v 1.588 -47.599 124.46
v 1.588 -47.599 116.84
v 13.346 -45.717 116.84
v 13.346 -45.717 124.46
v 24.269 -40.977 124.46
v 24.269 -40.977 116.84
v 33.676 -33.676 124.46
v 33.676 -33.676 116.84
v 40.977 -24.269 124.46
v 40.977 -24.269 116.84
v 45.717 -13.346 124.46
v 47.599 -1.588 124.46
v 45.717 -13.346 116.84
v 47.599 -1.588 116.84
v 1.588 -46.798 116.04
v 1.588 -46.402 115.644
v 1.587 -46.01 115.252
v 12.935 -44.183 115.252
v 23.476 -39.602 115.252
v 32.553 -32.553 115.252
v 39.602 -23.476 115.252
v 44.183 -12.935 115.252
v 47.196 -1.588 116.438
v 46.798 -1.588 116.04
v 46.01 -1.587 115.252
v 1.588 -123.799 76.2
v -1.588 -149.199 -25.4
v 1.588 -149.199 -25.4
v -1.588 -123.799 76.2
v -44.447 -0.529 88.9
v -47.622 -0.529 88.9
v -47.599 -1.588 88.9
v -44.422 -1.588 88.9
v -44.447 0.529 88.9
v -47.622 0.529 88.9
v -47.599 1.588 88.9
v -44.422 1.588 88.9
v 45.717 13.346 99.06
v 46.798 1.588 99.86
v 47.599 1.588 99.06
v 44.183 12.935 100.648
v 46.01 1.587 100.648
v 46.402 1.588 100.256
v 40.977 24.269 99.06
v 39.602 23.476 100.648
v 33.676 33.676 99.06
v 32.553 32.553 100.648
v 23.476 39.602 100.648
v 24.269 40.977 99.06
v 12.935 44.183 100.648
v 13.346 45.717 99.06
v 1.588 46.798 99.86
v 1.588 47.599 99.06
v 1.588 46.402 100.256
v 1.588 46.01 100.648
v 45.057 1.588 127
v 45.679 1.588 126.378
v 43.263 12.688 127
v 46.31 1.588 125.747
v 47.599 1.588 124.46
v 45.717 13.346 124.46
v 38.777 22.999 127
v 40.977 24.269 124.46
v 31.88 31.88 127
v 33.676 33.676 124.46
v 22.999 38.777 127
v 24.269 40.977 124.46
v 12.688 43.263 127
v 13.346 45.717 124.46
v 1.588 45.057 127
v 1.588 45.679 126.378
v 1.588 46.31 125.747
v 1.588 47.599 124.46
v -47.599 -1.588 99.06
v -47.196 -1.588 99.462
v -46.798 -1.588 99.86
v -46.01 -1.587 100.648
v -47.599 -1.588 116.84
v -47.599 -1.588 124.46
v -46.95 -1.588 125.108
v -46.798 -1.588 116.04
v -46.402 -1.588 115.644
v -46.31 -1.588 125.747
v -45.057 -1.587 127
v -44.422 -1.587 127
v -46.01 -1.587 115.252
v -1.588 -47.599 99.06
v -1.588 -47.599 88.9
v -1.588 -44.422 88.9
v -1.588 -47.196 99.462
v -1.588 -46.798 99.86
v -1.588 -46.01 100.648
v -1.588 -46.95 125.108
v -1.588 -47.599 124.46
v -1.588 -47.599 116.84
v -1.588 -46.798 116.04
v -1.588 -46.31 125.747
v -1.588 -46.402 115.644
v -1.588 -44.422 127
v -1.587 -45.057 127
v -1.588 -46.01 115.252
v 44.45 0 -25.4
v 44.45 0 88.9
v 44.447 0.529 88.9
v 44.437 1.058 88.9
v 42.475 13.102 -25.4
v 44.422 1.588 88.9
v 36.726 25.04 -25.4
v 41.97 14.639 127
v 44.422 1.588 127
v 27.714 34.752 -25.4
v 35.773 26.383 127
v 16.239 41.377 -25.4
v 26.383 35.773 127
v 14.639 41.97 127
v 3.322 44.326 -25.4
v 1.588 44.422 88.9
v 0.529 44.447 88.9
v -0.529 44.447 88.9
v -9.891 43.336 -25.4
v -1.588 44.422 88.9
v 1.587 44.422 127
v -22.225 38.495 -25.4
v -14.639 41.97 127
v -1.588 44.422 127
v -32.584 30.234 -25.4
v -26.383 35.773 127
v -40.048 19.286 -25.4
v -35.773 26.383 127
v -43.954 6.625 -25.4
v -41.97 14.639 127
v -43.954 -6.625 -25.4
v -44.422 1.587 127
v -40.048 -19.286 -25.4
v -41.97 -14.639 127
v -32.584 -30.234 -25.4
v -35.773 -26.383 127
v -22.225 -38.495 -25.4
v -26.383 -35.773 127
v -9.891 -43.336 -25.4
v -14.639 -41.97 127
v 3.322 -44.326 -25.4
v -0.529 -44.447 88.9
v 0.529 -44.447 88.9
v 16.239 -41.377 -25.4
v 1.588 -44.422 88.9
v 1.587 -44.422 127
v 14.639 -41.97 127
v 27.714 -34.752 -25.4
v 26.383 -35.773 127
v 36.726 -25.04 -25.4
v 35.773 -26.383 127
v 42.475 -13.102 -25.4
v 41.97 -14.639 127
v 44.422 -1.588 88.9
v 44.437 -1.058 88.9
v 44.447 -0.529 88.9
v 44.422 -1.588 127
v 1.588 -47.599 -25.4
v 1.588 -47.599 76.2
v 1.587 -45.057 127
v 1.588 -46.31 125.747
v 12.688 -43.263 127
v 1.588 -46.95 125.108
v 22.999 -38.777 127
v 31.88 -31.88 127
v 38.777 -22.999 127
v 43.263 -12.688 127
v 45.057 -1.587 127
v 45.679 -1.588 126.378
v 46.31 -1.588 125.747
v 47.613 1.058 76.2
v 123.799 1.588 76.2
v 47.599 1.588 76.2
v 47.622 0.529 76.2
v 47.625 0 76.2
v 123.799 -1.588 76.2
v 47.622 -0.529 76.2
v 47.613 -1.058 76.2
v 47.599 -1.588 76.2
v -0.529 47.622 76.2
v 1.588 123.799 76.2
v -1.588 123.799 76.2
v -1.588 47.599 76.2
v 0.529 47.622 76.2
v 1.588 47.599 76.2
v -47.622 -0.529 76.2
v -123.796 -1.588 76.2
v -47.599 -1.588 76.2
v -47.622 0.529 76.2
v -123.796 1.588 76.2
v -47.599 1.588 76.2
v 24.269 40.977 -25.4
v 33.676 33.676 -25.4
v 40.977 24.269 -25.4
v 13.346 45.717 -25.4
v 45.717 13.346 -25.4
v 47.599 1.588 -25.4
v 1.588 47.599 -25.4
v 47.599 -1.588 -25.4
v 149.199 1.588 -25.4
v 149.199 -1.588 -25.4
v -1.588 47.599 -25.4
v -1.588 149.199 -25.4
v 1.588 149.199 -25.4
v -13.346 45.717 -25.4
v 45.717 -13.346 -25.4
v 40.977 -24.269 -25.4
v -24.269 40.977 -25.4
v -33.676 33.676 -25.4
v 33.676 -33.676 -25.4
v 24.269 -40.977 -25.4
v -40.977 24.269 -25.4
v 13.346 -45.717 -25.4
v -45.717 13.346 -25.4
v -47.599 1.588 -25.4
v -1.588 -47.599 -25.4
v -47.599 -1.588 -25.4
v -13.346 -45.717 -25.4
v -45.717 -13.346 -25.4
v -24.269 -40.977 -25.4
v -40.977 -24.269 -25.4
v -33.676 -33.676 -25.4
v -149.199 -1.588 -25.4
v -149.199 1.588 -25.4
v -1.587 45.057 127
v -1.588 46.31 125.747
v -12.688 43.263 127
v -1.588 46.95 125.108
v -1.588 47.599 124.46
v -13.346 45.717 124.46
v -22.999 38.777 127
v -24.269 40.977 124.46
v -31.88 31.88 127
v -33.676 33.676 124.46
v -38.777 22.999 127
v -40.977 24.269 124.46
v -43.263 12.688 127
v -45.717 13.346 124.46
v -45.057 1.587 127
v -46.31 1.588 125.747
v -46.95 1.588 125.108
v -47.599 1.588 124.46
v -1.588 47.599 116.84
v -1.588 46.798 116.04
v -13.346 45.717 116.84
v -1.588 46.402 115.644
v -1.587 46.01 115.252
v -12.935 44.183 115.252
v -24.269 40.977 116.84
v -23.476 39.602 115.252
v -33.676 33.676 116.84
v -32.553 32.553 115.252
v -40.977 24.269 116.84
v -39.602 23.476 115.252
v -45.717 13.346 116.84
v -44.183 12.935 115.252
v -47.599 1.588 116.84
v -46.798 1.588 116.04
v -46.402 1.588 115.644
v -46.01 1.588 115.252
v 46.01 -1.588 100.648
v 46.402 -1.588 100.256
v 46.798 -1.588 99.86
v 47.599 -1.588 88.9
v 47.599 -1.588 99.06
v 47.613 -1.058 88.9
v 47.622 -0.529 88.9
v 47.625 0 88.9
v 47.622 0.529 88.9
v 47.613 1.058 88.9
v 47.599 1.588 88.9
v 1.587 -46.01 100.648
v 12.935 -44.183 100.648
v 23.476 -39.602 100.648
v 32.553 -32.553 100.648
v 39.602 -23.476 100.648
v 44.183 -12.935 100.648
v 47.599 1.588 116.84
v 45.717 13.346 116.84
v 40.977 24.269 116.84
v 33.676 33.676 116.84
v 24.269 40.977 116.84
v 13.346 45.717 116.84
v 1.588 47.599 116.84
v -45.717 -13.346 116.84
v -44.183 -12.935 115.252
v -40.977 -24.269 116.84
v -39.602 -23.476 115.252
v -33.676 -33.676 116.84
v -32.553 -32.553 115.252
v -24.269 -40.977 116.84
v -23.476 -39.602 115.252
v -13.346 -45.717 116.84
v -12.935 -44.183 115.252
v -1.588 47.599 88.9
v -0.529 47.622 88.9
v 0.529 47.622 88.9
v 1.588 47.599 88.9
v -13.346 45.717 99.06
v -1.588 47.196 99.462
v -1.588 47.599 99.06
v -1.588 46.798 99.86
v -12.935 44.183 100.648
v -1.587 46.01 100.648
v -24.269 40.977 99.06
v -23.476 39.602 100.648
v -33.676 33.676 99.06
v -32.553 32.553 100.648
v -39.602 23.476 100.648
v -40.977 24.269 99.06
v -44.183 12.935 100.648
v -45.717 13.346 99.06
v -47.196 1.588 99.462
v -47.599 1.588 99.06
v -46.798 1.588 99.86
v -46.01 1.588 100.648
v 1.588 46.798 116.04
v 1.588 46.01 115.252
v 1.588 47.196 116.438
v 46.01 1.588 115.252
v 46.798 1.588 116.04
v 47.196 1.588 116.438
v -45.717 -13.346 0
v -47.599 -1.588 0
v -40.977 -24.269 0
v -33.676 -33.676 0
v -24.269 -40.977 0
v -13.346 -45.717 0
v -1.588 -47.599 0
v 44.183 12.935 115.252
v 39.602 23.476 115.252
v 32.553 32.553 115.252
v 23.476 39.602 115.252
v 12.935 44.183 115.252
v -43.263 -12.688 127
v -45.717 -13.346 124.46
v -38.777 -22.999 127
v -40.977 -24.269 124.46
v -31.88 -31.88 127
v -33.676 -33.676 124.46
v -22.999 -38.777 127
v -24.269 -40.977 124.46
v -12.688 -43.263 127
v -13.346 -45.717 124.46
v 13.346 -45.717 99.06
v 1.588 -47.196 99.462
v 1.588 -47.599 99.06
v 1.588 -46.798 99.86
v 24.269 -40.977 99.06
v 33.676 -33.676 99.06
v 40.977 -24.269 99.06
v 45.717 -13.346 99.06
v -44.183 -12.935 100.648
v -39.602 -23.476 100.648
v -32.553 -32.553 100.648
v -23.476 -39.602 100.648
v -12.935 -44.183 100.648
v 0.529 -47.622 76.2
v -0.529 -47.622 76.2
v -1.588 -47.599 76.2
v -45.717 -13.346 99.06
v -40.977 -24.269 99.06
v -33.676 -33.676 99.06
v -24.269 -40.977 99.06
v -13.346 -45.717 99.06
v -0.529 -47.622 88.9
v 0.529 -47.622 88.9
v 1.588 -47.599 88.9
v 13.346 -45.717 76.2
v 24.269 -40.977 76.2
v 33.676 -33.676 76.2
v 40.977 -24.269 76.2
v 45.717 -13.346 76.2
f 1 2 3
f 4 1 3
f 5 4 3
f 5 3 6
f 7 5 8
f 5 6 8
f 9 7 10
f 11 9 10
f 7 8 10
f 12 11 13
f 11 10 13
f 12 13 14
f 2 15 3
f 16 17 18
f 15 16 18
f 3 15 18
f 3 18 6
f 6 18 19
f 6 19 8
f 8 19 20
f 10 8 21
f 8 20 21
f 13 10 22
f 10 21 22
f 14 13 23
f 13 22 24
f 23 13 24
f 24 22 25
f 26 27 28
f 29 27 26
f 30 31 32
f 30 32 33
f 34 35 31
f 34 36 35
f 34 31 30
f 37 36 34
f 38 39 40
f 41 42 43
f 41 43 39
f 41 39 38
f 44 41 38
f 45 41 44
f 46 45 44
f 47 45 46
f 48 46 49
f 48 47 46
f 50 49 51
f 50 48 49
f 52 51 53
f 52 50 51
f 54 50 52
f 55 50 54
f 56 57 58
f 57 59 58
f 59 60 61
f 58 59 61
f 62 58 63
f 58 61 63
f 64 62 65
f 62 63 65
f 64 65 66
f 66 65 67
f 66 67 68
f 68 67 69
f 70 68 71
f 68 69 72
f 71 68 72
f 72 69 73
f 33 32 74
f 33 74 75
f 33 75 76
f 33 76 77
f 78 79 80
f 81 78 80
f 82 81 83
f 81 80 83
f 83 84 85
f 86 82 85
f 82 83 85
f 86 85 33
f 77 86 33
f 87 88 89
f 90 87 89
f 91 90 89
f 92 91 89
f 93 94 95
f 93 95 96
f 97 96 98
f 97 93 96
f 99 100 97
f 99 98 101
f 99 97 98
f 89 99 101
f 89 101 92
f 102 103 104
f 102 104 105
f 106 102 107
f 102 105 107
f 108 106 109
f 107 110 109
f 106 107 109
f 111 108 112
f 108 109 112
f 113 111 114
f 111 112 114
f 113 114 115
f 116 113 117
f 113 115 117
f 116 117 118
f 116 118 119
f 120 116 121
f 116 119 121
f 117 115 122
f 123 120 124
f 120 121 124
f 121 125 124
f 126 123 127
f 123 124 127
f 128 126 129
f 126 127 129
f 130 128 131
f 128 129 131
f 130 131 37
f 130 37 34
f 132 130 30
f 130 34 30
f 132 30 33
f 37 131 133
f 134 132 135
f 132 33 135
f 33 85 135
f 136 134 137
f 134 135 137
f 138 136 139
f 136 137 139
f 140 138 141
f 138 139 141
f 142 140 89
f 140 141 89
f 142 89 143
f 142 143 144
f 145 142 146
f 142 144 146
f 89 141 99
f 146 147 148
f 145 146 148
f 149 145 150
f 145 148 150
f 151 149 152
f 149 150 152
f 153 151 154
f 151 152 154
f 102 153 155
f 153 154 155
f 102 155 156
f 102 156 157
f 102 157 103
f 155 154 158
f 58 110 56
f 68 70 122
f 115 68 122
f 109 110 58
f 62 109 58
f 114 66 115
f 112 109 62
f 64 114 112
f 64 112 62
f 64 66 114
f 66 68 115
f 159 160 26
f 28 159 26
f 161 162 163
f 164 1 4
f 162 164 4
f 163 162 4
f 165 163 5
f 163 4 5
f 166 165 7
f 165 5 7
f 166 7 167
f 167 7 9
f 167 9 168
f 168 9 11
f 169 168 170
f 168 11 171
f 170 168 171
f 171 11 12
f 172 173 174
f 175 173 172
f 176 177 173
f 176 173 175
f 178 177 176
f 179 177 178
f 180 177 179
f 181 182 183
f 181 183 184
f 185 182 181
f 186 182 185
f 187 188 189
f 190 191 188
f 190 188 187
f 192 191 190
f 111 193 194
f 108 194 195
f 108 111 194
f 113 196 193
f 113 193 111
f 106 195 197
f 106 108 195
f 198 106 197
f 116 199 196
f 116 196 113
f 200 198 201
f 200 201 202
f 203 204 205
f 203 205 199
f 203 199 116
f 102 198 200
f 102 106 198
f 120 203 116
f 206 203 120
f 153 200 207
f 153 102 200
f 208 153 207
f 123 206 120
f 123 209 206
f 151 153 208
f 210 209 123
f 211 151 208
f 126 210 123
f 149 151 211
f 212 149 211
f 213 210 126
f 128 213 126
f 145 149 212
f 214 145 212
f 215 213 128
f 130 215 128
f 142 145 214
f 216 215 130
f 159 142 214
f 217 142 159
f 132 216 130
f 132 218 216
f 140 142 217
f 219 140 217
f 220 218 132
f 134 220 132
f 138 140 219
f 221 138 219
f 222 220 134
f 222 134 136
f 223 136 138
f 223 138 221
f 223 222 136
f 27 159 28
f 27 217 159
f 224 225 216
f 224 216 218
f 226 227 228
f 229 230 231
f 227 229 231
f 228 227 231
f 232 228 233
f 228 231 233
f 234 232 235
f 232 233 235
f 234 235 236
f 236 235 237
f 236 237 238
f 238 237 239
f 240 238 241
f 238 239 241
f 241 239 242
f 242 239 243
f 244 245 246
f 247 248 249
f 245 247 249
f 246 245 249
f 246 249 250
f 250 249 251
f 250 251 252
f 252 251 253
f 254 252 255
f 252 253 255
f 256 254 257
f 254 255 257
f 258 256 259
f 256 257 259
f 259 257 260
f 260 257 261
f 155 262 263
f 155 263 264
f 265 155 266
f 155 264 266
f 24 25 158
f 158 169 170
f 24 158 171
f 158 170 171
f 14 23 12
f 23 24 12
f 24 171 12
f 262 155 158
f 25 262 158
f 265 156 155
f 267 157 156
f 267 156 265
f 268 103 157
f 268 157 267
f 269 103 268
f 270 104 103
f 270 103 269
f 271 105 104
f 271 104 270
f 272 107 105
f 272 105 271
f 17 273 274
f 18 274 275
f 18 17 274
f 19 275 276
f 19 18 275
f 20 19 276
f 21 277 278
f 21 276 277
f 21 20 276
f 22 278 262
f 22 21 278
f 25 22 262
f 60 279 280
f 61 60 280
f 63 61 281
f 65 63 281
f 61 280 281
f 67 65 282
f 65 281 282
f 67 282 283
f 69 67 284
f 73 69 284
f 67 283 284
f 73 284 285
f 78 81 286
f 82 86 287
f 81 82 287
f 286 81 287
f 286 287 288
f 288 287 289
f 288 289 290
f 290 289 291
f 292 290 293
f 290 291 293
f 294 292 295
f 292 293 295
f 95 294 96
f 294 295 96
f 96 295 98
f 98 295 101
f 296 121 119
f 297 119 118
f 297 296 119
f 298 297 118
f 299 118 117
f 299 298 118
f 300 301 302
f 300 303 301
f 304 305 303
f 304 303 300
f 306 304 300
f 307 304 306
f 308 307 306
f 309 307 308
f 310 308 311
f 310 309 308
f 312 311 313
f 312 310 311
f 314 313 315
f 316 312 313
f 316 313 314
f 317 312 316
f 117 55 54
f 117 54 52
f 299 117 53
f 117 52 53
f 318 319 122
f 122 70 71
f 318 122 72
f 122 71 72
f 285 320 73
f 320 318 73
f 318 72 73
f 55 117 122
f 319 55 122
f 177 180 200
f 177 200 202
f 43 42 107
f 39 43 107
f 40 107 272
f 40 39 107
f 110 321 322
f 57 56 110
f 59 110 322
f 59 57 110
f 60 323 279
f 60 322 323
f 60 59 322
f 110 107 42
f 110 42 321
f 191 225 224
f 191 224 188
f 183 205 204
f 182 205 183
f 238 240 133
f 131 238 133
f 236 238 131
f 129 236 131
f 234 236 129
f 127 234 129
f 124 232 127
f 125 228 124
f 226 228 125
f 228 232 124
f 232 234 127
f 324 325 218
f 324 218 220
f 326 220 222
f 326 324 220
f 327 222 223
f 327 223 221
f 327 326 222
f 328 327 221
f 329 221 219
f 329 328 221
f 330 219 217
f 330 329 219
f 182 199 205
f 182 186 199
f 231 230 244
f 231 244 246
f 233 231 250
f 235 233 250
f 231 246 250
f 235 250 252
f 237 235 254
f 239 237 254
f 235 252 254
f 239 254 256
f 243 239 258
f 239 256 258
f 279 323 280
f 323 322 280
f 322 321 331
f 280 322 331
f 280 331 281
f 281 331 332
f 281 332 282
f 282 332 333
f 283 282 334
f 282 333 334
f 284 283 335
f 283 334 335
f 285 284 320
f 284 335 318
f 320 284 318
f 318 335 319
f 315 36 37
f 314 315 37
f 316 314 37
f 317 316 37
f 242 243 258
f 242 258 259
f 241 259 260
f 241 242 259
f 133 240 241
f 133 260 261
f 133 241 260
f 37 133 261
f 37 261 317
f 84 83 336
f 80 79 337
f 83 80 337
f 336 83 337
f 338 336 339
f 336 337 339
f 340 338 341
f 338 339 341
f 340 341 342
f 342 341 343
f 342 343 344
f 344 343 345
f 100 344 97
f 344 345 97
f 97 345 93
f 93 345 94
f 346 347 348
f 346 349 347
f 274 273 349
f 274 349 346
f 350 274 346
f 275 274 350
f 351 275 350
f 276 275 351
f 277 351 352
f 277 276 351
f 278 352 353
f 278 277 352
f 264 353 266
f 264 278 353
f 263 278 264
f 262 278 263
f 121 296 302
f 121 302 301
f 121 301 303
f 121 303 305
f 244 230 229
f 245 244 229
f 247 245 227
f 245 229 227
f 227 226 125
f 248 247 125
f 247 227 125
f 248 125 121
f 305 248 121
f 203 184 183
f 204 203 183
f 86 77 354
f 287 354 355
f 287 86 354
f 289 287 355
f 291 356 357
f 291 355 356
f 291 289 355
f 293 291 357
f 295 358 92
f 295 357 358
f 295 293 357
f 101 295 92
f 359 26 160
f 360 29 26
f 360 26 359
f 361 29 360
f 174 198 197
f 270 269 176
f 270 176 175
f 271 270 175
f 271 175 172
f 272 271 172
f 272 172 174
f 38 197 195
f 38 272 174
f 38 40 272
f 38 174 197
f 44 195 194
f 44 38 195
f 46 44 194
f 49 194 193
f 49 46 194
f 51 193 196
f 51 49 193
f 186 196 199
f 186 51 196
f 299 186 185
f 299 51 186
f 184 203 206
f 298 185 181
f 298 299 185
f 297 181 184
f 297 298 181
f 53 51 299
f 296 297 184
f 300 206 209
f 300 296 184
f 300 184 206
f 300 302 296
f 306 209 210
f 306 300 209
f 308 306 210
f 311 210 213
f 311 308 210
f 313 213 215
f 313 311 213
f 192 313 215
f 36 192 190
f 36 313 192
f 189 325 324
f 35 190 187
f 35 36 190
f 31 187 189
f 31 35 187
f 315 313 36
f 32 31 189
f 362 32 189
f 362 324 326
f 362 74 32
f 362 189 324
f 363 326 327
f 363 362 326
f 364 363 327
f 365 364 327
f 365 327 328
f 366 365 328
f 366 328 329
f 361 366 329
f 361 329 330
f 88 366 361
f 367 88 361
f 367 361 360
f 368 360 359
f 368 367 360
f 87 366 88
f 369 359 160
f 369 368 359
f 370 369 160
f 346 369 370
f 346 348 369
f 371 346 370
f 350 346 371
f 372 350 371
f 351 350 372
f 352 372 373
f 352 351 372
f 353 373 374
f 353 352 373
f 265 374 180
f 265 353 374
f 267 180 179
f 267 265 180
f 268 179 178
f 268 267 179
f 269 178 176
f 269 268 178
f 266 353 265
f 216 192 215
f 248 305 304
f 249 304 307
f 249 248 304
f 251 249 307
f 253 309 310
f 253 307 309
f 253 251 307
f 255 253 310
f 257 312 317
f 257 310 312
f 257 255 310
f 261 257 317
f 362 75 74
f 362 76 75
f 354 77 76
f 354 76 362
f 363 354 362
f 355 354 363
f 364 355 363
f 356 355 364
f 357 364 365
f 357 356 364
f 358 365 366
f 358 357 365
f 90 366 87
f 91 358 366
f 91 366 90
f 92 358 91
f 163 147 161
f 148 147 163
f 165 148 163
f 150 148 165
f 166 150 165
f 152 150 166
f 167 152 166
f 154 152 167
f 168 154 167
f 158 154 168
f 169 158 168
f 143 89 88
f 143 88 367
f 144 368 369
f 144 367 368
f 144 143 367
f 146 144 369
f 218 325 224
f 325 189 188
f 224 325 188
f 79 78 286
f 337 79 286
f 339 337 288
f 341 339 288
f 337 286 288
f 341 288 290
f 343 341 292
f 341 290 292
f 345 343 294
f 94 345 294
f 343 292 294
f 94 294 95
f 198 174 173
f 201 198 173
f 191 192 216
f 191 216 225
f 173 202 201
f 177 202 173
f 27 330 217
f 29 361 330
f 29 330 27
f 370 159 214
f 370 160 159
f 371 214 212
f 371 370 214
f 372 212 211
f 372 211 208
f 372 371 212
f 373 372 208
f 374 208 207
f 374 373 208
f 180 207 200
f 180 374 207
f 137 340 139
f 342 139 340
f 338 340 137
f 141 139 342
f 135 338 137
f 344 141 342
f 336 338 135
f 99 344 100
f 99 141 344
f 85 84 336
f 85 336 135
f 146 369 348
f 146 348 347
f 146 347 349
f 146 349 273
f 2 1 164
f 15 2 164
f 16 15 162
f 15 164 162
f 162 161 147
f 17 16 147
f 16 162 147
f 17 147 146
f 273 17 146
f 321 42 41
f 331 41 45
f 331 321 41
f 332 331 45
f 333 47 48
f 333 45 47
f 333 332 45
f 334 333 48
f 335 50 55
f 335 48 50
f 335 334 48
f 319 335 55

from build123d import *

# Parameters (mm, degrees)
F0_R         = 44.45
F1_DEPTH     = 76.2
F2_R         = 47.625
F2_R_2       = 44.45
F3_DEPTH     = 127
F4_W         = 3.175
F4_H         = 46.0375
F4_H_2       = 3.175
F4_W_2       = 46.0375
F5_DEPTH     = 38.1
F6_W         = 1.5875
F6_H         = 12.7
F8_T2_ANGLE  = 101.902331204
F8_T6_ANGLE  = 101.902331204
F8_S7_R      = 46.0375
F8_T8_DEPTH  = 39
F8_T12_ANGLE = 101.902331204
F8_S13_R     = 46.0375
F8_T14_DEPTH = 39
F8_T18_ANGLE = 101.902331204
F8_S19_R     = 46.0375
F8_T20_DEPTH = 39
F8_T24_ANGLE = 101.902331204
F8_S25_R     = 46.0375
F8_T26_DEPTH = 39
F8_T28_ANGLE = 101.902331204
F8_T32_ANGLE = 101.902331204
F8_S33_R     = 46.0375
F8_T34_DEPTH = 39
F8_T36_ANGLE = 101.902331204
F8_T40_ANGLE = 101.902331204
F8_S41_R     = 46.0375
F8_T42_DEPTH = 39
F8_T44_ANGLE = 101.902331204
F8_T48_ANGLE = 101.902331204
F8_S49_R     = 46.0375
F8_T50_DEPTH = 39
F8_T54_ANGLE = 101.902331204
F8_S55_R     = 46.0375
F8_T56_DEPTH = 39
F9_DEPTH     = 25.4
F11_DEPTH    = 3.175
F13_DEPTH    = 3.175
F15_DEPTH    = 3.175
F17_DEPTH    = 3.175


# Not quite as in the source:
# - a fillet or chamfer that OpenCascade refuses, or shapes differently, is made with other operations: its cross-section is extruded or revolved along the edge and cut away or added


with BuildPart() as f1:
    # F0 (on Top) → F1 (new body)
    with BuildSketch(Plane.XY):
        with BuildLine():
            Line((101.6, 1.5875), (47.598534313, 1.5875))
            ThreePointArc((47.598534313, 1.5875), (33.675960454, 33.675960454), (1.5875, 47.598534313))
            Line((1.5875, 47.598534313), (1.5875, 101.5875968992))
            Line((1.5875, 101.5875968992), (-1.5875, 101.5875968992))
            Line((-1.5875, 101.5875968992), (-1.5875, 47.598534313))
            ThreePointArc((-1.5875, 47.598534313), (-33.675960454, 33.675960454), (-47.598534313, 1.5875))
            Line((-47.598534313, 1.5875), (-101.6, 1.5875))
            Line((-101.6, 1.5875), (-101.6, -1.5875))
            Line((-101.6, -1.5875), (-47.598534313, -1.5875))
            ThreePointArc((-47.598534313, -1.5875), (-33.675960454, -33.675960454), (-1.5875, -47.598534313))
            Line((-1.5875, -47.598534313), (-1.5875, -101.6))
            Line((-1.5875, -101.6), (1.5875, -101.6))
            Line((1.5875, -101.6), (1.5875, -47.598534313))
            ThreePointArc((1.5875, -47.598534313), (33.675960454, -33.675960454), (47.598534313, -1.5875))
            Line((47.598534313, -1.5875), (101.6, -1.5875))
            Line((101.6, -1.5875), (101.6, 1.5875))
        make_face()
        Circle(F0_R, mode=Mode.SUBTRACT)
    extrude(amount=F1_DEPTH)

    # F2 (on Top) → F3 (join)
    with BuildSketch(Plane.XY):
        Circle(F2_R)
        Circle(F2_R_2, mode=Mode.SUBTRACT)
    extrude(amount=F3_DEPTH)

    # F4 (on face) → F5 (cut)
    with BuildSketch(Plane.XY.offset(127)):
        with Locations((0, 24.60625)):
            Rectangle(F4_W, F4_H)
        Rectangle(F4_W, F4_H_2)
        with Locations((-24.60625, 0)):
            Rectangle(F4_W_2, F4_H_2)
        with Locations((0, -24.60625)):
            Rectangle(F4_W, F4_H)
        with Locations((24.60625, 0)):
            Rectangle(F4_W_2, F4_H_2)
    extrude(amount=-F5_DEPTH, mode=Mode.SUBTRACT)

    # F6 (on Right) → F7 (revolve, cut)
    with BuildSketch(Plane.YZ):
        with Locations((-46.83125, 107.95)):
            Rectangle(F6_W, F6_H)
    revolve(axis=Axis((0, 0, 63.5), (0, 0, 1)), mode=Mode.SUBTRACT)

    # F8: chamfer of 2.54 on 12 edges, made by hand

    # F8_s1 → F8_t2 (revolve, cut)
    with BuildSketch(Plane(origin=(0, 0, 0), x_dir=(0, 0, 1), z_dir=(0.1036807735, 0.9946106259, 0))):
        Polygon((127, -45.085), (124.46, -47.625), (127, -47.625), align=None)
    revolve(axis=Axis((0, 0, 127), (0, 0, 1)), revolution_arc=F8_T2_ANGLE, mode=Mode.SUBTRACT)


with BuildPart() as f8_tool4:
    # F8_s5 → F8_t6 (revolve)
    with BuildSketch(Plane(origin=(0, 0, 0), x_dir=(0, 0, 1), z_dir=(0.1036807735, 0.9946106259, 0))):
        Polygon((116.84, -47.625), (114.3, -45.085), (114.3, -47.625), align=None)
    revolve(axis=Axis((0, 0, 114.3), (0, 0, 1)), revolution_arc=F8_T6_ANGLE)

    # F8_s7 → F8_t8 (cut, symmetric)
    with BuildSketch(Plane.XY.offset(115.6)):
        Circle(F8_S7_R)
    extrude(amount=F8_T8_DEPTH, both=True, mode=Mode.SUBTRACT)


with BuildPart() as f1_1:
    add(f1.part)

    # F8_t3: cut F8_tool4
    add(f8_tool4.part, mode=Mode.SUBTRACT)


with BuildPart() as f8_tool10:
    # F8_s11 → F8_t12 (revolve)
    with BuildSketch(Plane(origin=(0, 0, 0), x_dir=(0, 0, 1), z_dir=(0.1036807735, 0.9946106259, 0))):
        Polygon((99.06, -47.625), (101.6, -45.085), (101.6, -47.625), align=None)
    revolve(axis=Axis((0, 0, 101.6), (0, 0, 1)), revolution_arc=F8_T12_ANGLE)

    # F8_s13 → F8_t14 (cut, symmetric)
    with BuildSketch(Plane.XY.offset(100.3)):
        Circle(F8_S13_R)
    extrude(amount=F8_T14_DEPTH, both=True, mode=Mode.SUBTRACT)


with BuildPart() as f1_2:
    add(f1_1.part)

    # F8_t9: cut F8_tool10
    add(f8_tool10.part, mode=Mode.SUBTRACT)


with BuildPart() as f8_tool16:
    # F8_s17 → F8_t18 (revolve)
    with BuildSketch(Plane(origin=(0, 0, 0), x_dir=(0, 0, 1), z_dir=(-0.9946106259, 0.1036807735, 0))):
        Polygon((99.06, -47.625), (101.6, -45.085), (101.6, -47.625), align=None)
    revolve(axis=Axis((0, 0, 101.6), (0, 0, 1)), revolution_arc=F8_T18_ANGLE)

    # F8_s19 → F8_t20 (cut, symmetric)
    with BuildSketch(Plane.XY.offset(100.3)):
        Circle(F8_S19_R)
    extrude(amount=F8_T20_DEPTH, both=True, mode=Mode.SUBTRACT)


with BuildPart() as f1_3:
    add(f1_2.part)

    # F8_t15: cut F8_tool16
    add(f8_tool16.part, mode=Mode.SUBTRACT)


with BuildPart() as f8_tool22:
    # F8_s23 → F8_t24 (revolve)
    with BuildSketch(Plane(origin=(0, 0, 0), x_dir=(0, 0, 1), z_dir=(-0.9946106259, 0.1036807735, 0))):
        Polygon((116.84, -47.625), (114.3, -45.085), (114.3, -47.625), align=None)
    revolve(axis=Axis((0, 0, 114.3), (0, 0, 1)), revolution_arc=F8_T24_ANGLE)

    # F8_s25 → F8_t26 (cut, symmetric)
    with BuildSketch(Plane.XY.offset(115.6)):
        Circle(F8_S25_R)
    extrude(amount=F8_T26_DEPTH, both=True, mode=Mode.SUBTRACT)


with BuildPart() as f1_4:
    add(f1_3.part)

    # F8_t21: cut F8_tool22
    add(f8_tool22.part, mode=Mode.SUBTRACT)

    # F8_s27 → F8_t28 (revolve, cut)
    with BuildSketch(Plane(origin=(0, 0, 0), x_dir=(0, 0, 1), z_dir=(-0.9946106259, 0.1036807735, 0))):
        Polygon((127, -45.085), (124.46, -47.625), (127, -47.625), align=None)
    revolve(axis=Axis((0, 0, 127), (0, 0, 1)), revolution_arc=F8_T28_ANGLE, mode=Mode.SUBTRACT)


with BuildPart() as f8_tool30:
    # F8_s31 → F8_t32 (revolve)
    with BuildSketch(Plane(origin=(0, 0, 0), x_dir=(0, 0, 1), z_dir=(0.9946106259, -0.1036807735, 0))):
        Polygon((116.84, -47.625), (114.3, -45.085), (114.3, -47.625), align=None)
    revolve(axis=Axis((0, 0, 114.3), (0, 0, 1)), revolution_arc=F8_T32_ANGLE)

    # F8_s33 → F8_t34 (cut, symmetric)
    with BuildSketch(Plane.XY.offset(115.6)):
        Circle(F8_S33_R)
    extrude(amount=F8_T34_DEPTH, both=True, mode=Mode.SUBTRACT)


with BuildPart() as f1_5:
    add(f1_4.part)

    # F8_t29: cut F8_tool30
    add(f8_tool30.part, mode=Mode.SUBTRACT)

    # F8_s35 → F8_t36 (revolve, cut)
    with BuildSketch(Plane(origin=(0, 0, 0), x_dir=(0, 0, 1), z_dir=(0.9946106259, -0.1036807735, 0))):
        Polygon((127, -45.085), (124.46, -47.625), (127, -47.625), align=None)
    revolve(axis=Axis((0, 0, 127), (0, 0, 1)), revolution_arc=F8_T36_ANGLE, mode=Mode.SUBTRACT)


with BuildPart() as f8_tool38:
    # F8_s39 → F8_t40 (revolve)
    with BuildSketch(Plane(origin=(0, 0, 0), x_dir=(0, 0, 1), z_dir=(0.9946106259, -0.1036807735, 0))):
        Polygon((99.06, -47.625), (101.6, -45.085), (101.6, -47.625), align=None)
    revolve(axis=Axis((0, 0, 101.6), (0, 0, 1)), revolution_arc=F8_T40_ANGLE)

    # F8_s41 → F8_t42 (cut, symmetric)
    with BuildSketch(Plane.XY.offset(100.3)):
        Circle(F8_S41_R)
    extrude(amount=F8_T42_DEPTH, both=True, mode=Mode.SUBTRACT)


with BuildPart() as f1_6:
    add(f1_5.part)

    # F8_t37: cut F8_tool38
    add(f8_tool38.part, mode=Mode.SUBTRACT)

    # F8_s43 → F8_t44 (revolve, cut)
    with BuildSketch(Plane(origin=(0, 0, 0), x_dir=(0, 0, 1), z_dir=(-0.1036807735, -0.9946106259, 0))):
        Polygon((127, -45.085), (124.46, -47.625), (127, -47.625), align=None)
    revolve(axis=Axis((0, 0, 127), (0, 0, 1)), revolution_arc=F8_T44_ANGLE, mode=Mode.SUBTRACT)


with BuildPart() as f8_tool46:
    # F8_s47 → F8_t48 (revolve)
    with BuildSketch(Plane(origin=(0, 0, 0), x_dir=(0, 0, 1), z_dir=(-0.1036807735, -0.9946106259, 0))):
        Polygon((116.84, -47.625), (114.3, -45.085), (114.3, -47.625), align=None)
    revolve(axis=Axis((0, 0, 114.3), (0, 0, 1)), revolution_arc=F8_T48_ANGLE)

    # F8_s49 → F8_t50 (cut, symmetric)
    with BuildSketch(Plane.XY.offset(115.6)):
        Circle(F8_S49_R)
    extrude(amount=F8_T50_DEPTH, both=True, mode=Mode.SUBTRACT)


with BuildPart() as f1_7:
    add(f1_6.part)

    # F8_t45: cut F8_tool46
    add(f8_tool46.part, mode=Mode.SUBTRACT)


with BuildPart() as f8_tool52:
    # F8_s53 → F8_t54 (revolve)
    with BuildSketch(Plane(origin=(0, 0, 0), x_dir=(0, 0, 1), z_dir=(-0.1036807735, -0.9946106259, 0))):
        Polygon((99.06, -47.625), (101.6, -45.085), (101.6, -47.625), align=None)
    revolve(axis=Axis((0, 0, 101.6), (0, 0, 1)), revolution_arc=F8_T54_ANGLE)

    # F8_s55 → F8_t56 (cut, symmetric)
    with BuildSketch(Plane.XY.offset(100.3)):
        Circle(F8_S55_R)
    extrude(amount=F8_T56_DEPTH, both=True, mode=Mode.SUBTRACT)


with BuildPart() as f1_8:
    add(f1_7.part)

    # F8_t51: cut F8_tool52
    add(f8_tool52.part, mode=Mode.SUBTRACT)

    # F9 (add): a face of the model
    f9_faces = [f1_8.faces().sort_by_distance(p)[0] for p in [
        (0, -98.7264057431, 0),
    ]]
    extrude(f9_faces, amount=F9_DEPTH)

    # F10 (on face) → F11 (join, through all)
    with BuildSketch(Plane(origin=(0, 1.5875, 0), x_dir=(-1, 0, 0), z_dir=(0, 1, 0))):
        Polygon((123.7956061959, 76.2), (101.6, 76.2), (101.6, -25.4), (149.198534313, -25.4), align=None)
    extrude(amount=-F11_DEPTH)

    # F12 (on face) → F13 (join, through all)
    with BuildSketch(Plane.YZ.offset(1.5875)):
        Polygon((101.5875968992, 76.2), (101.5875968992, -25.4), (149.198534313, -25.4), (123.798534313, 76.2), align=None)
    extrude(amount=-F13_DEPTH)

    # F14 (on face) → F15 (join, through all)
    with BuildSketch(Plane.XZ.offset(1.5875)):
        Polygon((123.798534313, 76.2), (101.6, 76.2), (101.6, -25.4), (149.198534313, -25.4), align=None)
    extrude(amount=-F15_DEPTH)

    # F16 (on face) → F17 (join, through all)
    with BuildSketch(Plane(origin=(-1.5875, 0, 0), x_dir=(0, -1, 0), z_dir=(-1, 0, 0))):
        Polygon((123.798534313, 76.2), (101.6, 76.2), (101.6, -25.4), (149.198534313, -25.4), align=None)
    extrude(amount=-F17_DEPTH)


solid = f1_8.part
